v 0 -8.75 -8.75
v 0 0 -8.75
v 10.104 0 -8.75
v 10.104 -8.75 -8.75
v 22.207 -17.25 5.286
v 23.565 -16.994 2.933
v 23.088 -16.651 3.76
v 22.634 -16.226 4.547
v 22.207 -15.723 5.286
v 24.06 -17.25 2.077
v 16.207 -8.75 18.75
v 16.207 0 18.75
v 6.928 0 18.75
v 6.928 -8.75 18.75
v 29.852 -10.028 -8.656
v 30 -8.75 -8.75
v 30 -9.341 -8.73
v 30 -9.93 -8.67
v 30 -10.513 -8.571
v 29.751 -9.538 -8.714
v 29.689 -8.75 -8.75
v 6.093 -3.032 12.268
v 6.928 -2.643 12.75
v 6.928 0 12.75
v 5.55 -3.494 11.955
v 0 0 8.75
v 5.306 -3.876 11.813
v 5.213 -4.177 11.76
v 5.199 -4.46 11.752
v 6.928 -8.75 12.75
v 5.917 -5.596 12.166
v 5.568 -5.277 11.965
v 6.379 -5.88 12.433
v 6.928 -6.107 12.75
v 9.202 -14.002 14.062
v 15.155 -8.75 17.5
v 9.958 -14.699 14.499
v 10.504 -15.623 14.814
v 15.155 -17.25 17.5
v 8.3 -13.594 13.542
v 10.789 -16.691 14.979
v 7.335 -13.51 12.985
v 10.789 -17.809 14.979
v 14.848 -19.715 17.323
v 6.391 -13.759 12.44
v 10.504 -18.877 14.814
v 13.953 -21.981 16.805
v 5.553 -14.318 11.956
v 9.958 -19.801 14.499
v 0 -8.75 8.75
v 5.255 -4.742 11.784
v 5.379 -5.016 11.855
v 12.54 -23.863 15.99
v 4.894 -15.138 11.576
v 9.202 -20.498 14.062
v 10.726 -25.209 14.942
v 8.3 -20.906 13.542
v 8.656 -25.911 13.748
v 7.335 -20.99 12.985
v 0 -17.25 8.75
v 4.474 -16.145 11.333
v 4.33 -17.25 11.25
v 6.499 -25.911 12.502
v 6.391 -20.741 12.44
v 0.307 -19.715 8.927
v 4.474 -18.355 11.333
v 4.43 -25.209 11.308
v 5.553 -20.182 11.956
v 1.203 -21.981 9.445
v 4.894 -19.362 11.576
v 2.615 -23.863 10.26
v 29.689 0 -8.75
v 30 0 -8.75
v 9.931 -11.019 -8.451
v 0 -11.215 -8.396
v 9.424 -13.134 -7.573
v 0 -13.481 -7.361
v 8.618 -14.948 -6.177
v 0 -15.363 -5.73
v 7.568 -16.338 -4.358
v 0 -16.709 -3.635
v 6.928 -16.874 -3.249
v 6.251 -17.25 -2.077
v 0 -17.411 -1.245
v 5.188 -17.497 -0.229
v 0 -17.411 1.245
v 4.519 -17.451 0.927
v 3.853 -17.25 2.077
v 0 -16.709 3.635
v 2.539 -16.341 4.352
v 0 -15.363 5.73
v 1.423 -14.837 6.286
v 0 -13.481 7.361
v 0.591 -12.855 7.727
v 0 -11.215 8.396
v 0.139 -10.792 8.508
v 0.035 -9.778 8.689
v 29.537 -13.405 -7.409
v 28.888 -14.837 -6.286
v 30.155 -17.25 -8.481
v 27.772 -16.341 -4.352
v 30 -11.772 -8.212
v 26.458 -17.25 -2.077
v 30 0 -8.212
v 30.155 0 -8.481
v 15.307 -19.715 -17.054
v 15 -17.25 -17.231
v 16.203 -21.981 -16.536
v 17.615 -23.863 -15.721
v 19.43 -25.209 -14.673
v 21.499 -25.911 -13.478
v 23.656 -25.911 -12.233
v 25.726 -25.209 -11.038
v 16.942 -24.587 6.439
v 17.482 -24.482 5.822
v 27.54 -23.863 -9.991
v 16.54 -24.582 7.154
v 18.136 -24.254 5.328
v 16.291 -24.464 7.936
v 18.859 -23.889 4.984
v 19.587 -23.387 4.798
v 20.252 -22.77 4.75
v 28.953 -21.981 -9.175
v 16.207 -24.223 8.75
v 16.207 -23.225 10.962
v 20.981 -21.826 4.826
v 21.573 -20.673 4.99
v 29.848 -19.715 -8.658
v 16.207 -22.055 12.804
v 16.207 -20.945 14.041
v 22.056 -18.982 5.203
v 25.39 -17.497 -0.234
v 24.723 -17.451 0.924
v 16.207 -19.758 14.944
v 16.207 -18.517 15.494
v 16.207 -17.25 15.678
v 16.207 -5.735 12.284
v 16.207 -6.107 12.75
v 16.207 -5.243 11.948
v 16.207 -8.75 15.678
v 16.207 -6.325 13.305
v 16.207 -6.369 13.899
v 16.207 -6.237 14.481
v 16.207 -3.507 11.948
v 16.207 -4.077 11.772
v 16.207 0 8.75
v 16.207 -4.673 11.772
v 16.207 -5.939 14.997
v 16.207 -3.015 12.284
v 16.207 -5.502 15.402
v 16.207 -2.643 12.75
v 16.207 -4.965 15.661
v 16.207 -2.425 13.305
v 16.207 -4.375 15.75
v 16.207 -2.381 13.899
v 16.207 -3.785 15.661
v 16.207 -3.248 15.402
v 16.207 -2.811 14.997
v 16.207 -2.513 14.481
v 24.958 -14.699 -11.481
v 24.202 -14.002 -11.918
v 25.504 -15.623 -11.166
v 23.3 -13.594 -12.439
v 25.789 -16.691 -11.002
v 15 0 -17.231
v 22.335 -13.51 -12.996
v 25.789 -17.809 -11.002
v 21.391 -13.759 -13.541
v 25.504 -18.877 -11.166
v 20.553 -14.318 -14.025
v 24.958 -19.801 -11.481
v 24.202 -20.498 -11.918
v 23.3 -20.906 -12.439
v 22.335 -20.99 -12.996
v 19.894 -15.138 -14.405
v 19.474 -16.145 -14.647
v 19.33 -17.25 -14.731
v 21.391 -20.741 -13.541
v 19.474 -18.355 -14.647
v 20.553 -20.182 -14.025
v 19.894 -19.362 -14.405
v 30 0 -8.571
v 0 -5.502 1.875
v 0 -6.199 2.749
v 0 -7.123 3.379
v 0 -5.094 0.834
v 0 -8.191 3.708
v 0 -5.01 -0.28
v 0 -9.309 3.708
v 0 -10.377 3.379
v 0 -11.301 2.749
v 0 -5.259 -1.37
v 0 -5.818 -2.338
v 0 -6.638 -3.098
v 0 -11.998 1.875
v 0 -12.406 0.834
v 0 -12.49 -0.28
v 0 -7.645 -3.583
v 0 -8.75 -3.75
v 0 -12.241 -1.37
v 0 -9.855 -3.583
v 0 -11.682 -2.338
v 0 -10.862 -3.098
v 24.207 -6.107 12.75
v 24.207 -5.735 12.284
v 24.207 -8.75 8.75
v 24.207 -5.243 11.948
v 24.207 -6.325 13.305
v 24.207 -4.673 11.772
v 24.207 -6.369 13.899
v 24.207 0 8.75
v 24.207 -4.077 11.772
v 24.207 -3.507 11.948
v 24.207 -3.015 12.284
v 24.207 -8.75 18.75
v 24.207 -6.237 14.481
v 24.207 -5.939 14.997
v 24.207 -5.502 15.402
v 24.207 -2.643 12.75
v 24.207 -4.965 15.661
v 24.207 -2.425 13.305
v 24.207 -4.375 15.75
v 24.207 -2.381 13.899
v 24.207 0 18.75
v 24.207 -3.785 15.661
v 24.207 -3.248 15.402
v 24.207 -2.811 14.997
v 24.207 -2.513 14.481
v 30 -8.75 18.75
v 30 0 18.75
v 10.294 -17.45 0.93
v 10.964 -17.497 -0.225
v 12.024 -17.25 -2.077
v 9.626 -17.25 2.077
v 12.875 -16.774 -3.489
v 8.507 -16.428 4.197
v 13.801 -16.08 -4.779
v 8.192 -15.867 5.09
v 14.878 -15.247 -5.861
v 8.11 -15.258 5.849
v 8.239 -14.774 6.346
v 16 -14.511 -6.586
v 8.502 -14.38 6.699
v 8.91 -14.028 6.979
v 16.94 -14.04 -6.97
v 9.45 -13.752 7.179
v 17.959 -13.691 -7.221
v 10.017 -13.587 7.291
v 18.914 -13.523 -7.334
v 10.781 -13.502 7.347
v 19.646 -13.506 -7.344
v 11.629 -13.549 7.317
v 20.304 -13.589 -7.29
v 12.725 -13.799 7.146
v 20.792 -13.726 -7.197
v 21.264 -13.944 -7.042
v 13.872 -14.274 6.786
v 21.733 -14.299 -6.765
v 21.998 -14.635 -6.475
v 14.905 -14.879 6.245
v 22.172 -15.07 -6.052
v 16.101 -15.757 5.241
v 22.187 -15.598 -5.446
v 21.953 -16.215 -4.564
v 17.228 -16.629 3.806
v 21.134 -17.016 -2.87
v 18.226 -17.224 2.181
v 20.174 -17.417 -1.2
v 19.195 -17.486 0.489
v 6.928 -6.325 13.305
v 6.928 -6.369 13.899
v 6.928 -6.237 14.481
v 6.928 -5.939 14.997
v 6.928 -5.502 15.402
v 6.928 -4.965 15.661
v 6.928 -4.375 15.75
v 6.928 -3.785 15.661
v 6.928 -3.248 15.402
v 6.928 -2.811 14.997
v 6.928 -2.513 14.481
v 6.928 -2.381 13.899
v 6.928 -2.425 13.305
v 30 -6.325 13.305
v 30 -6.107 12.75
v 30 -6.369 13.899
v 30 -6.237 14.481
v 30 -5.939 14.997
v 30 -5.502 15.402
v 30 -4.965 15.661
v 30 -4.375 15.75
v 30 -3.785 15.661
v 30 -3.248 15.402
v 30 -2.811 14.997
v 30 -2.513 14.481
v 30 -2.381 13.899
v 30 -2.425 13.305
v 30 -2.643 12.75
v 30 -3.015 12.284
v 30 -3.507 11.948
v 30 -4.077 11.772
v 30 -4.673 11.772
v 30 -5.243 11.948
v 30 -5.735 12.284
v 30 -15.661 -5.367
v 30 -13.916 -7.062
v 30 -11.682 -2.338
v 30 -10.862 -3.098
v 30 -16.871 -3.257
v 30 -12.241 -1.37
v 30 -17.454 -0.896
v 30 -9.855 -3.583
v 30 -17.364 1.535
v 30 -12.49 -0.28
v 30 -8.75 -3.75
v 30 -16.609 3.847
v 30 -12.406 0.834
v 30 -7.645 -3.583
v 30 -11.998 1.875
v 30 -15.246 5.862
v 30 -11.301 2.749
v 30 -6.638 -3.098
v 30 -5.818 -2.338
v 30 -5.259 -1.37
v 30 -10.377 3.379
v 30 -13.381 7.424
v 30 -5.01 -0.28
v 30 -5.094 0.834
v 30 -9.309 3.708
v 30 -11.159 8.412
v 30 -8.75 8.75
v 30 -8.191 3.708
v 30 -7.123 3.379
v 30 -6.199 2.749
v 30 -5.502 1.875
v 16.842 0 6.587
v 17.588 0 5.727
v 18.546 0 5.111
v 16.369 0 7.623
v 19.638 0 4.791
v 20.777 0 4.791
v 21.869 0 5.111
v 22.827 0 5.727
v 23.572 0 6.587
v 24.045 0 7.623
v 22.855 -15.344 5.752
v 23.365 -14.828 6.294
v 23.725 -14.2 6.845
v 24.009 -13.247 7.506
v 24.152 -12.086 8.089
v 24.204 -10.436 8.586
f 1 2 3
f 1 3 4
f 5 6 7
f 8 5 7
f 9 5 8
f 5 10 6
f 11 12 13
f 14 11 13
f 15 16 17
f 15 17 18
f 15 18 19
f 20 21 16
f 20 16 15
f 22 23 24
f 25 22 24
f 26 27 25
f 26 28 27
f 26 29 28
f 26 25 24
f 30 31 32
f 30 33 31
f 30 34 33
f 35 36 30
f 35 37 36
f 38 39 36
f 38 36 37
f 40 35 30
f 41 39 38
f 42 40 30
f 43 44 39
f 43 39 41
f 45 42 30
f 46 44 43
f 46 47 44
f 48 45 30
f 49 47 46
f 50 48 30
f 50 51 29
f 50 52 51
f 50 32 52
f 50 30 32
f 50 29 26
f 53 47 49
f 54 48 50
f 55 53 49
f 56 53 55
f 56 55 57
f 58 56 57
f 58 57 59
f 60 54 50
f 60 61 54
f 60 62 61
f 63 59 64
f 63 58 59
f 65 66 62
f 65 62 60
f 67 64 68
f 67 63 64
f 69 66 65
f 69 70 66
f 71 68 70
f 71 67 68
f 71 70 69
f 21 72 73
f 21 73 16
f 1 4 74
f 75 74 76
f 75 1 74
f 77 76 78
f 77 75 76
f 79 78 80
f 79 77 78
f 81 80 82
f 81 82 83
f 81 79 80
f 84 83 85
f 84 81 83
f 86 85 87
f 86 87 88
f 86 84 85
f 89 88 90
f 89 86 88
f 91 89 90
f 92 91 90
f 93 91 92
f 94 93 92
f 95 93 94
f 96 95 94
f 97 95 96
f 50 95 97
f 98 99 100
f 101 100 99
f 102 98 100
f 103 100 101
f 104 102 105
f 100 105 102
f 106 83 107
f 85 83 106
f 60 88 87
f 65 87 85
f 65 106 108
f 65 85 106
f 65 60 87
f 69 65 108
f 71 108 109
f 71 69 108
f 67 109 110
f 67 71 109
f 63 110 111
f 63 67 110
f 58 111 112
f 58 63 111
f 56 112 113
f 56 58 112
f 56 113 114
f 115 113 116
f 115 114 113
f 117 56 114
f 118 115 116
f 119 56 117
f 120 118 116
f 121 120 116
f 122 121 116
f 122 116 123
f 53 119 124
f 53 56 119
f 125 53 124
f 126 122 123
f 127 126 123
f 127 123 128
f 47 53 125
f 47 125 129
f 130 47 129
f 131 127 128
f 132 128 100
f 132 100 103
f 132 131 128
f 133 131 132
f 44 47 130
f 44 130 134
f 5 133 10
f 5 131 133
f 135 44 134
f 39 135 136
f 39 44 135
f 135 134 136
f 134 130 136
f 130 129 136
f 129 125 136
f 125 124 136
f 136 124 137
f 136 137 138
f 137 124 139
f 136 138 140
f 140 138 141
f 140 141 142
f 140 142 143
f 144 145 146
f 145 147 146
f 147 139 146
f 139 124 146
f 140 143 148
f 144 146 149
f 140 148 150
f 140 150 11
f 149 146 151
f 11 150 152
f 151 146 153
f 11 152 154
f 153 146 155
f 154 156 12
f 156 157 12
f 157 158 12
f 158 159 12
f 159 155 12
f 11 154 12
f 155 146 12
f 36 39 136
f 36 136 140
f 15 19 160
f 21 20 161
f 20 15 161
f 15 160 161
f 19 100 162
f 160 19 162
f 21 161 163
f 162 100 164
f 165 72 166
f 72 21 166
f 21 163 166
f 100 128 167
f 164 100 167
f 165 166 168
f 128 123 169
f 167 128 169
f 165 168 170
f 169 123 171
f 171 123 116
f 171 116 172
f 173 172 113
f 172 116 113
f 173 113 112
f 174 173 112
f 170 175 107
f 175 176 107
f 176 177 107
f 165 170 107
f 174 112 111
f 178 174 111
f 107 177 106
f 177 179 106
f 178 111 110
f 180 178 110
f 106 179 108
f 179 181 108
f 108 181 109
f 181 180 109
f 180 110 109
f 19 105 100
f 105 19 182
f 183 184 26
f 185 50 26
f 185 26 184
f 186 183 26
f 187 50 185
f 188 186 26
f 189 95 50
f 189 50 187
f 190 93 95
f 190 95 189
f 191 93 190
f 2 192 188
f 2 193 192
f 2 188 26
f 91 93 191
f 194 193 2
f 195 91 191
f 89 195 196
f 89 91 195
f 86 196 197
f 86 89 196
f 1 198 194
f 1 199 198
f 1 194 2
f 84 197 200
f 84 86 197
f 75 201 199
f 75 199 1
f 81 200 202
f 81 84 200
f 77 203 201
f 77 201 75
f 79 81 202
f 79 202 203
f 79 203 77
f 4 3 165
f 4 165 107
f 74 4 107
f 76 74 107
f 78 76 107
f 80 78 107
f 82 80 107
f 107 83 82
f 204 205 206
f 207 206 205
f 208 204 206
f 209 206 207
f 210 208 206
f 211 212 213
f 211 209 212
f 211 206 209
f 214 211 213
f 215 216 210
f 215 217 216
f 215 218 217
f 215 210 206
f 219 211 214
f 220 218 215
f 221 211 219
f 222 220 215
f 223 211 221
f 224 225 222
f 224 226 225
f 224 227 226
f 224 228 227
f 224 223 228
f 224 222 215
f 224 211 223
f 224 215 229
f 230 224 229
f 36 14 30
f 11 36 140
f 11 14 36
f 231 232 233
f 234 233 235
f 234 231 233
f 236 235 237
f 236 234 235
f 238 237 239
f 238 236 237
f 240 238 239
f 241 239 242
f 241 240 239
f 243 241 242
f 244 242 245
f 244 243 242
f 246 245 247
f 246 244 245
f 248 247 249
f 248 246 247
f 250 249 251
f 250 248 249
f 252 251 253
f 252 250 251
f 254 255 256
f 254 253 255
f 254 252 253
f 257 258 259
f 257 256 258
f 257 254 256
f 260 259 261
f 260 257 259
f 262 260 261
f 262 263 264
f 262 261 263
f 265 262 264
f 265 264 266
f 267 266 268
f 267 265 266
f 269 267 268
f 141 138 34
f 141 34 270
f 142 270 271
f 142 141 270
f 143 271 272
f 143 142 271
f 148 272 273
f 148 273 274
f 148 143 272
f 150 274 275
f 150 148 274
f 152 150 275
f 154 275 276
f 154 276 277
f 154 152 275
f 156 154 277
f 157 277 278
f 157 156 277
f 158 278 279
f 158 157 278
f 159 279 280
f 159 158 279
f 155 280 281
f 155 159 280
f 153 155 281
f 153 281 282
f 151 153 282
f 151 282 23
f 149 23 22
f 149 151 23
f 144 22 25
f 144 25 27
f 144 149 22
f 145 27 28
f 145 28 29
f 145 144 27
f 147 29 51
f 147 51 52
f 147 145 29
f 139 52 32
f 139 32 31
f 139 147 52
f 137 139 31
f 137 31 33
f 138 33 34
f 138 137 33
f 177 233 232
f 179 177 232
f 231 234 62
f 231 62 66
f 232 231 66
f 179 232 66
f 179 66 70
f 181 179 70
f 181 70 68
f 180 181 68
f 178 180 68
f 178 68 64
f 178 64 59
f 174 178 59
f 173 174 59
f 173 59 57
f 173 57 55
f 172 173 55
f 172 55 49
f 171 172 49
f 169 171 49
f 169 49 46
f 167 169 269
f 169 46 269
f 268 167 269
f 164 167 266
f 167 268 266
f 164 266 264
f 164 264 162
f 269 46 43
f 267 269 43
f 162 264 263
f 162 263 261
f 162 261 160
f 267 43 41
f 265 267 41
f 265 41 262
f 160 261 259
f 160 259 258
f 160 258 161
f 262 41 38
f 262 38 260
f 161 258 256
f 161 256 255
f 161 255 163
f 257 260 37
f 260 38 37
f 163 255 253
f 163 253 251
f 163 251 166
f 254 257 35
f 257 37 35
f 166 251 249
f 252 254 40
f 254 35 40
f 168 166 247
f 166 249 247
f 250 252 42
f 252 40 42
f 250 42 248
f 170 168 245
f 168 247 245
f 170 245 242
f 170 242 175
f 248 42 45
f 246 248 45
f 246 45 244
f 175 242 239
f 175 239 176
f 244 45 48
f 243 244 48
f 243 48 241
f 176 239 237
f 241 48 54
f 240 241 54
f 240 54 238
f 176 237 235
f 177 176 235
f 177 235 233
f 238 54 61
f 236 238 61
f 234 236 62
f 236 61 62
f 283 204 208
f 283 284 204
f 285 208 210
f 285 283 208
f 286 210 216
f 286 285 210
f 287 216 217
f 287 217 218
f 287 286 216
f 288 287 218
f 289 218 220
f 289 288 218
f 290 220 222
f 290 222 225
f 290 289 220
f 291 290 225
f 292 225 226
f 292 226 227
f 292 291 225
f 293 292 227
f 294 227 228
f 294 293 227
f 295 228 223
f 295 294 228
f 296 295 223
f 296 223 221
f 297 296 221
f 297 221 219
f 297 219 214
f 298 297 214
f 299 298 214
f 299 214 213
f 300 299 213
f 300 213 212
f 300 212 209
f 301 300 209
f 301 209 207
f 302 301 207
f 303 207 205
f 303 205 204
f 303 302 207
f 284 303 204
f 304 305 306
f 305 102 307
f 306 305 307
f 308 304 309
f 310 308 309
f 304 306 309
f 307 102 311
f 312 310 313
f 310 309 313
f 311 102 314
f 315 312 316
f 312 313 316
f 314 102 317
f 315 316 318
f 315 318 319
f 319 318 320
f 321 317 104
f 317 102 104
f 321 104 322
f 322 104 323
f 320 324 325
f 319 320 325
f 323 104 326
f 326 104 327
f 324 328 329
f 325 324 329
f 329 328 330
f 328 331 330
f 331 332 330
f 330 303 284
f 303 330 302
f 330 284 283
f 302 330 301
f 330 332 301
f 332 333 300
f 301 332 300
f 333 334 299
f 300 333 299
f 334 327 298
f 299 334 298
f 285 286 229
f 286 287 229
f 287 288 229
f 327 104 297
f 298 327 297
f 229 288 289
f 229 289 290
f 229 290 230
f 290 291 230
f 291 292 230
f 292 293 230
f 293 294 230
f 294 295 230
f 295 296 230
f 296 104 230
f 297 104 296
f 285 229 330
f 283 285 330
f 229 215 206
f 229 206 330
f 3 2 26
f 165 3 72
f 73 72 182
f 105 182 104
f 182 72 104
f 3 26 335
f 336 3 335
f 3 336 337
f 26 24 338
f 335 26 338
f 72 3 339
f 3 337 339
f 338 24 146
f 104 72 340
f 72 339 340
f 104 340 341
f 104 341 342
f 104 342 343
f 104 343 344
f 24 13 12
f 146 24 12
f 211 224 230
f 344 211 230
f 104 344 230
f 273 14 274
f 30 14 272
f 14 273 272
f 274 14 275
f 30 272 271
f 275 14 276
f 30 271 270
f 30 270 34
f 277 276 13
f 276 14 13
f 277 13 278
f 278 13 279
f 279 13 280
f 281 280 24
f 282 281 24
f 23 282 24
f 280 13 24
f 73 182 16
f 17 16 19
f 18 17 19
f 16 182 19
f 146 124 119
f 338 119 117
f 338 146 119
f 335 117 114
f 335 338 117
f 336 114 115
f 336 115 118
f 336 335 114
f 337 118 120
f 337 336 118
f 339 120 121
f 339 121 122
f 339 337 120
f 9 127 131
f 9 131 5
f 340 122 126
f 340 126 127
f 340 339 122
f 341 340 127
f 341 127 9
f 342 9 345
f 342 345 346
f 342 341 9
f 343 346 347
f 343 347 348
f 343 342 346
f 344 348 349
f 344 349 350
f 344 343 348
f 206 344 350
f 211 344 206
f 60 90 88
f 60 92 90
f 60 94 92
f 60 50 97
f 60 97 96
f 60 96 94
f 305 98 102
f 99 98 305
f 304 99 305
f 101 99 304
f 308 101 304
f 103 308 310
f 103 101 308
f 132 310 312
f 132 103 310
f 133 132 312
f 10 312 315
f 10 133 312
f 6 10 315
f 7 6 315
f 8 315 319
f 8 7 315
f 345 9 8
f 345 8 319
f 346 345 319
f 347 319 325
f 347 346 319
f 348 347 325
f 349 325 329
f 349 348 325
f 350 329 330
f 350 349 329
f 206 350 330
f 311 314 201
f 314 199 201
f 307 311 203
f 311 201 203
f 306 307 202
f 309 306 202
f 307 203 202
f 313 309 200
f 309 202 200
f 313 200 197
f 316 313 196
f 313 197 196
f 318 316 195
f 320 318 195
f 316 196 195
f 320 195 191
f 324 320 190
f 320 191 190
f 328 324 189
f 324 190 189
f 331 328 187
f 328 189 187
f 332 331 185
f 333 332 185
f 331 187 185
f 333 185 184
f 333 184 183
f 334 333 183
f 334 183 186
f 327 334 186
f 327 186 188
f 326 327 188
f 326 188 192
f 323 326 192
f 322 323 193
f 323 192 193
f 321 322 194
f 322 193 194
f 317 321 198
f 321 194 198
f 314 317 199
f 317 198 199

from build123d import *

# Parameters (mm, degrees)
SKETCH1_R           = 3.75
BOSS_EXTRUDE1_DEPTH = 30
SKETCH2_R           = 3.75
BOSS_EXTRUDE2_DEPTH = 30
CUT_EXTRUDE1_DEPTH  = 27.0000001
SKETCH4_W           = 5.792740578
SKETCH4_H           = 10
BOSS_EXTRUDE3_DEPTH = 8.75
BOSS_EXTRUDE4_DEPTH = 8.75
SKETCH5_R           = 2
CUT_EXTRUDE2_DEPTH  = 31.0000001
SKETCH7_R           = 3.75
CUT_EXTRUDE3_DEPTH  = 31.155444666
SKETCH8_R           = 3.75
CUT_EXTRUDE4_DEPTH  = 38.57772242


with BuildPart() as part:
    # Sketch1 → Boss-Extrude1 (new body)
    with BuildSketch(Plane(origin=(0, 0, 0), x_dir=(0, 0, -1), z_dir=(1, 0, 0))):
        with BuildLine():
            Line((-8.75, 0), (8.75, 0))
            Line((8.75, 0), (8.75, 8.75))
            ThreePointArc((8.75, 8.75), (0, 17.5), (-8.75, 8.75))
            Line((-8.75, 8.75), (-8.75, 0))
        make_face()
        with Locations((0, 8.75)):
            Circle(SKETCH1_R, mode=Mode.SUBTRACT)
    extrude(amount=BOSS_EXTRUDE1_DEPTH)

    # Sketch2 → Boss-Extrude2 (add)
    with BuildSketch(Plane(origin=(-3.788861142, 0, 6.5625), x_dir=(-0.866025404, 0, -0.5), z_dir=(0.5, 0, -0.866025404))):
        with BuildLine():
            Line((-4.375, 0), (-4.375, 17.25))
            ThreePointArc((-4.375, 17.25), (-13.125, 26), (-21.875, 17.25))
            Line((-21.875, 17.25), (-21.875, 0))
            Line((-21.875, 0), (-4.375, 0))
        make_face()
        with Locations((-13.125, 17.25)):
            Circle(SKETCH2_R, mode=Mode.SUBTRACT)
    extrude(amount=BOSS_EXTRUDE2_DEPTH)

    # Sketch3 → Cut-Extrude1 (cut, through all)
    with BuildSketch(Plane.XZ):
        with BuildLine():
            Line((24.207259422, 8.75), (24.207259422, 15.67820323))
            Line((24.207259422, 15.67820323), (16.207259422, 15.67820323))
            Line((16.207259422, 15.67820323), (16.207259422, 8.75))
            ThreePointArc((16.207259422, 8.75), (20.207259422, 4.75), (24.207259422, 8.75))
        make_face()
    extrude(amount=-CUT_EXTRUDE1_DEPTH, mode=Mode.SUBTRACT)

    # Sketch4 → Boss-Extrude3 (add)
    with BuildSketch(Plane.XZ):
        with Locations((27.103629711, 13.75)):
            Rectangle(SKETCH4_W, SKETCH4_H)
    extrude(amount=-BOSS_EXTRUDE3_DEPTH)

    # Sketch6 → Boss-Extrude4 (add)
    with BuildSketch(Plane.XZ):
        Polygon((16.207259422, 15.67820323), (16.207259422, 18.75), (6.92820323, 18.75), (6.92820323, 12.75), align=None)
    extrude(amount=-BOSS_EXTRUDE4_DEPTH)

    # Sketch5 → Cut-Extrude2 (cut, through all)
    with BuildSketch(Plane(origin=(30, 0, 0), x_dir=(0, 0, -1), z_dir=(1, 0, 0))):
        with Locations(Location((-13.75, 4.375, 0), (0, 0, 60))):  # turned: the seam where the file's is
            Circle(SKETCH5_R)
    extrude(amount=-CUT_EXTRUDE2_DEPTH, mode=Mode.SUBTRACT)

    # Sketch7 → Cut-Extrude3 (cut, through all)
    with BuildSketch(Plane.ZY):
        with Locations(Location((0, 8.75, 0), (0, 0, 180))):  # turned: the seam where the file's is
            Circle(SKETCH7_R)
    extrude(amount=-CUT_EXTRUDE3_DEPTH, mode=Mode.SUBTRACT)

    # Sketch8 → Cut-Extrude4 (cut, through all)
    with BuildSketch(Plane(origin=(-3.788861142, 0, 6.5625), x_dir=(0.866025404, 0, 0.5), z_dir=(-0.5, 0, 0.866025404))):
        with Locations(Location((13.125, 17.25, 0), (0, 0, 180))):  # turned: the seam where the file's is
            Circle(SKETCH8_R)
    extrude(amount=-CUT_EXTRUDE4_DEPTH, mode=Mode.SUBTRACT)


with BuildPart() as body_2:
    # Mirror1: mirrored copy
    add(part.part.mirror(Plane(origin=(30, 0, 8.75), x_dir=(0, 0, 1), z_dir=(0, 1, 0))))


solid = body_2.part
